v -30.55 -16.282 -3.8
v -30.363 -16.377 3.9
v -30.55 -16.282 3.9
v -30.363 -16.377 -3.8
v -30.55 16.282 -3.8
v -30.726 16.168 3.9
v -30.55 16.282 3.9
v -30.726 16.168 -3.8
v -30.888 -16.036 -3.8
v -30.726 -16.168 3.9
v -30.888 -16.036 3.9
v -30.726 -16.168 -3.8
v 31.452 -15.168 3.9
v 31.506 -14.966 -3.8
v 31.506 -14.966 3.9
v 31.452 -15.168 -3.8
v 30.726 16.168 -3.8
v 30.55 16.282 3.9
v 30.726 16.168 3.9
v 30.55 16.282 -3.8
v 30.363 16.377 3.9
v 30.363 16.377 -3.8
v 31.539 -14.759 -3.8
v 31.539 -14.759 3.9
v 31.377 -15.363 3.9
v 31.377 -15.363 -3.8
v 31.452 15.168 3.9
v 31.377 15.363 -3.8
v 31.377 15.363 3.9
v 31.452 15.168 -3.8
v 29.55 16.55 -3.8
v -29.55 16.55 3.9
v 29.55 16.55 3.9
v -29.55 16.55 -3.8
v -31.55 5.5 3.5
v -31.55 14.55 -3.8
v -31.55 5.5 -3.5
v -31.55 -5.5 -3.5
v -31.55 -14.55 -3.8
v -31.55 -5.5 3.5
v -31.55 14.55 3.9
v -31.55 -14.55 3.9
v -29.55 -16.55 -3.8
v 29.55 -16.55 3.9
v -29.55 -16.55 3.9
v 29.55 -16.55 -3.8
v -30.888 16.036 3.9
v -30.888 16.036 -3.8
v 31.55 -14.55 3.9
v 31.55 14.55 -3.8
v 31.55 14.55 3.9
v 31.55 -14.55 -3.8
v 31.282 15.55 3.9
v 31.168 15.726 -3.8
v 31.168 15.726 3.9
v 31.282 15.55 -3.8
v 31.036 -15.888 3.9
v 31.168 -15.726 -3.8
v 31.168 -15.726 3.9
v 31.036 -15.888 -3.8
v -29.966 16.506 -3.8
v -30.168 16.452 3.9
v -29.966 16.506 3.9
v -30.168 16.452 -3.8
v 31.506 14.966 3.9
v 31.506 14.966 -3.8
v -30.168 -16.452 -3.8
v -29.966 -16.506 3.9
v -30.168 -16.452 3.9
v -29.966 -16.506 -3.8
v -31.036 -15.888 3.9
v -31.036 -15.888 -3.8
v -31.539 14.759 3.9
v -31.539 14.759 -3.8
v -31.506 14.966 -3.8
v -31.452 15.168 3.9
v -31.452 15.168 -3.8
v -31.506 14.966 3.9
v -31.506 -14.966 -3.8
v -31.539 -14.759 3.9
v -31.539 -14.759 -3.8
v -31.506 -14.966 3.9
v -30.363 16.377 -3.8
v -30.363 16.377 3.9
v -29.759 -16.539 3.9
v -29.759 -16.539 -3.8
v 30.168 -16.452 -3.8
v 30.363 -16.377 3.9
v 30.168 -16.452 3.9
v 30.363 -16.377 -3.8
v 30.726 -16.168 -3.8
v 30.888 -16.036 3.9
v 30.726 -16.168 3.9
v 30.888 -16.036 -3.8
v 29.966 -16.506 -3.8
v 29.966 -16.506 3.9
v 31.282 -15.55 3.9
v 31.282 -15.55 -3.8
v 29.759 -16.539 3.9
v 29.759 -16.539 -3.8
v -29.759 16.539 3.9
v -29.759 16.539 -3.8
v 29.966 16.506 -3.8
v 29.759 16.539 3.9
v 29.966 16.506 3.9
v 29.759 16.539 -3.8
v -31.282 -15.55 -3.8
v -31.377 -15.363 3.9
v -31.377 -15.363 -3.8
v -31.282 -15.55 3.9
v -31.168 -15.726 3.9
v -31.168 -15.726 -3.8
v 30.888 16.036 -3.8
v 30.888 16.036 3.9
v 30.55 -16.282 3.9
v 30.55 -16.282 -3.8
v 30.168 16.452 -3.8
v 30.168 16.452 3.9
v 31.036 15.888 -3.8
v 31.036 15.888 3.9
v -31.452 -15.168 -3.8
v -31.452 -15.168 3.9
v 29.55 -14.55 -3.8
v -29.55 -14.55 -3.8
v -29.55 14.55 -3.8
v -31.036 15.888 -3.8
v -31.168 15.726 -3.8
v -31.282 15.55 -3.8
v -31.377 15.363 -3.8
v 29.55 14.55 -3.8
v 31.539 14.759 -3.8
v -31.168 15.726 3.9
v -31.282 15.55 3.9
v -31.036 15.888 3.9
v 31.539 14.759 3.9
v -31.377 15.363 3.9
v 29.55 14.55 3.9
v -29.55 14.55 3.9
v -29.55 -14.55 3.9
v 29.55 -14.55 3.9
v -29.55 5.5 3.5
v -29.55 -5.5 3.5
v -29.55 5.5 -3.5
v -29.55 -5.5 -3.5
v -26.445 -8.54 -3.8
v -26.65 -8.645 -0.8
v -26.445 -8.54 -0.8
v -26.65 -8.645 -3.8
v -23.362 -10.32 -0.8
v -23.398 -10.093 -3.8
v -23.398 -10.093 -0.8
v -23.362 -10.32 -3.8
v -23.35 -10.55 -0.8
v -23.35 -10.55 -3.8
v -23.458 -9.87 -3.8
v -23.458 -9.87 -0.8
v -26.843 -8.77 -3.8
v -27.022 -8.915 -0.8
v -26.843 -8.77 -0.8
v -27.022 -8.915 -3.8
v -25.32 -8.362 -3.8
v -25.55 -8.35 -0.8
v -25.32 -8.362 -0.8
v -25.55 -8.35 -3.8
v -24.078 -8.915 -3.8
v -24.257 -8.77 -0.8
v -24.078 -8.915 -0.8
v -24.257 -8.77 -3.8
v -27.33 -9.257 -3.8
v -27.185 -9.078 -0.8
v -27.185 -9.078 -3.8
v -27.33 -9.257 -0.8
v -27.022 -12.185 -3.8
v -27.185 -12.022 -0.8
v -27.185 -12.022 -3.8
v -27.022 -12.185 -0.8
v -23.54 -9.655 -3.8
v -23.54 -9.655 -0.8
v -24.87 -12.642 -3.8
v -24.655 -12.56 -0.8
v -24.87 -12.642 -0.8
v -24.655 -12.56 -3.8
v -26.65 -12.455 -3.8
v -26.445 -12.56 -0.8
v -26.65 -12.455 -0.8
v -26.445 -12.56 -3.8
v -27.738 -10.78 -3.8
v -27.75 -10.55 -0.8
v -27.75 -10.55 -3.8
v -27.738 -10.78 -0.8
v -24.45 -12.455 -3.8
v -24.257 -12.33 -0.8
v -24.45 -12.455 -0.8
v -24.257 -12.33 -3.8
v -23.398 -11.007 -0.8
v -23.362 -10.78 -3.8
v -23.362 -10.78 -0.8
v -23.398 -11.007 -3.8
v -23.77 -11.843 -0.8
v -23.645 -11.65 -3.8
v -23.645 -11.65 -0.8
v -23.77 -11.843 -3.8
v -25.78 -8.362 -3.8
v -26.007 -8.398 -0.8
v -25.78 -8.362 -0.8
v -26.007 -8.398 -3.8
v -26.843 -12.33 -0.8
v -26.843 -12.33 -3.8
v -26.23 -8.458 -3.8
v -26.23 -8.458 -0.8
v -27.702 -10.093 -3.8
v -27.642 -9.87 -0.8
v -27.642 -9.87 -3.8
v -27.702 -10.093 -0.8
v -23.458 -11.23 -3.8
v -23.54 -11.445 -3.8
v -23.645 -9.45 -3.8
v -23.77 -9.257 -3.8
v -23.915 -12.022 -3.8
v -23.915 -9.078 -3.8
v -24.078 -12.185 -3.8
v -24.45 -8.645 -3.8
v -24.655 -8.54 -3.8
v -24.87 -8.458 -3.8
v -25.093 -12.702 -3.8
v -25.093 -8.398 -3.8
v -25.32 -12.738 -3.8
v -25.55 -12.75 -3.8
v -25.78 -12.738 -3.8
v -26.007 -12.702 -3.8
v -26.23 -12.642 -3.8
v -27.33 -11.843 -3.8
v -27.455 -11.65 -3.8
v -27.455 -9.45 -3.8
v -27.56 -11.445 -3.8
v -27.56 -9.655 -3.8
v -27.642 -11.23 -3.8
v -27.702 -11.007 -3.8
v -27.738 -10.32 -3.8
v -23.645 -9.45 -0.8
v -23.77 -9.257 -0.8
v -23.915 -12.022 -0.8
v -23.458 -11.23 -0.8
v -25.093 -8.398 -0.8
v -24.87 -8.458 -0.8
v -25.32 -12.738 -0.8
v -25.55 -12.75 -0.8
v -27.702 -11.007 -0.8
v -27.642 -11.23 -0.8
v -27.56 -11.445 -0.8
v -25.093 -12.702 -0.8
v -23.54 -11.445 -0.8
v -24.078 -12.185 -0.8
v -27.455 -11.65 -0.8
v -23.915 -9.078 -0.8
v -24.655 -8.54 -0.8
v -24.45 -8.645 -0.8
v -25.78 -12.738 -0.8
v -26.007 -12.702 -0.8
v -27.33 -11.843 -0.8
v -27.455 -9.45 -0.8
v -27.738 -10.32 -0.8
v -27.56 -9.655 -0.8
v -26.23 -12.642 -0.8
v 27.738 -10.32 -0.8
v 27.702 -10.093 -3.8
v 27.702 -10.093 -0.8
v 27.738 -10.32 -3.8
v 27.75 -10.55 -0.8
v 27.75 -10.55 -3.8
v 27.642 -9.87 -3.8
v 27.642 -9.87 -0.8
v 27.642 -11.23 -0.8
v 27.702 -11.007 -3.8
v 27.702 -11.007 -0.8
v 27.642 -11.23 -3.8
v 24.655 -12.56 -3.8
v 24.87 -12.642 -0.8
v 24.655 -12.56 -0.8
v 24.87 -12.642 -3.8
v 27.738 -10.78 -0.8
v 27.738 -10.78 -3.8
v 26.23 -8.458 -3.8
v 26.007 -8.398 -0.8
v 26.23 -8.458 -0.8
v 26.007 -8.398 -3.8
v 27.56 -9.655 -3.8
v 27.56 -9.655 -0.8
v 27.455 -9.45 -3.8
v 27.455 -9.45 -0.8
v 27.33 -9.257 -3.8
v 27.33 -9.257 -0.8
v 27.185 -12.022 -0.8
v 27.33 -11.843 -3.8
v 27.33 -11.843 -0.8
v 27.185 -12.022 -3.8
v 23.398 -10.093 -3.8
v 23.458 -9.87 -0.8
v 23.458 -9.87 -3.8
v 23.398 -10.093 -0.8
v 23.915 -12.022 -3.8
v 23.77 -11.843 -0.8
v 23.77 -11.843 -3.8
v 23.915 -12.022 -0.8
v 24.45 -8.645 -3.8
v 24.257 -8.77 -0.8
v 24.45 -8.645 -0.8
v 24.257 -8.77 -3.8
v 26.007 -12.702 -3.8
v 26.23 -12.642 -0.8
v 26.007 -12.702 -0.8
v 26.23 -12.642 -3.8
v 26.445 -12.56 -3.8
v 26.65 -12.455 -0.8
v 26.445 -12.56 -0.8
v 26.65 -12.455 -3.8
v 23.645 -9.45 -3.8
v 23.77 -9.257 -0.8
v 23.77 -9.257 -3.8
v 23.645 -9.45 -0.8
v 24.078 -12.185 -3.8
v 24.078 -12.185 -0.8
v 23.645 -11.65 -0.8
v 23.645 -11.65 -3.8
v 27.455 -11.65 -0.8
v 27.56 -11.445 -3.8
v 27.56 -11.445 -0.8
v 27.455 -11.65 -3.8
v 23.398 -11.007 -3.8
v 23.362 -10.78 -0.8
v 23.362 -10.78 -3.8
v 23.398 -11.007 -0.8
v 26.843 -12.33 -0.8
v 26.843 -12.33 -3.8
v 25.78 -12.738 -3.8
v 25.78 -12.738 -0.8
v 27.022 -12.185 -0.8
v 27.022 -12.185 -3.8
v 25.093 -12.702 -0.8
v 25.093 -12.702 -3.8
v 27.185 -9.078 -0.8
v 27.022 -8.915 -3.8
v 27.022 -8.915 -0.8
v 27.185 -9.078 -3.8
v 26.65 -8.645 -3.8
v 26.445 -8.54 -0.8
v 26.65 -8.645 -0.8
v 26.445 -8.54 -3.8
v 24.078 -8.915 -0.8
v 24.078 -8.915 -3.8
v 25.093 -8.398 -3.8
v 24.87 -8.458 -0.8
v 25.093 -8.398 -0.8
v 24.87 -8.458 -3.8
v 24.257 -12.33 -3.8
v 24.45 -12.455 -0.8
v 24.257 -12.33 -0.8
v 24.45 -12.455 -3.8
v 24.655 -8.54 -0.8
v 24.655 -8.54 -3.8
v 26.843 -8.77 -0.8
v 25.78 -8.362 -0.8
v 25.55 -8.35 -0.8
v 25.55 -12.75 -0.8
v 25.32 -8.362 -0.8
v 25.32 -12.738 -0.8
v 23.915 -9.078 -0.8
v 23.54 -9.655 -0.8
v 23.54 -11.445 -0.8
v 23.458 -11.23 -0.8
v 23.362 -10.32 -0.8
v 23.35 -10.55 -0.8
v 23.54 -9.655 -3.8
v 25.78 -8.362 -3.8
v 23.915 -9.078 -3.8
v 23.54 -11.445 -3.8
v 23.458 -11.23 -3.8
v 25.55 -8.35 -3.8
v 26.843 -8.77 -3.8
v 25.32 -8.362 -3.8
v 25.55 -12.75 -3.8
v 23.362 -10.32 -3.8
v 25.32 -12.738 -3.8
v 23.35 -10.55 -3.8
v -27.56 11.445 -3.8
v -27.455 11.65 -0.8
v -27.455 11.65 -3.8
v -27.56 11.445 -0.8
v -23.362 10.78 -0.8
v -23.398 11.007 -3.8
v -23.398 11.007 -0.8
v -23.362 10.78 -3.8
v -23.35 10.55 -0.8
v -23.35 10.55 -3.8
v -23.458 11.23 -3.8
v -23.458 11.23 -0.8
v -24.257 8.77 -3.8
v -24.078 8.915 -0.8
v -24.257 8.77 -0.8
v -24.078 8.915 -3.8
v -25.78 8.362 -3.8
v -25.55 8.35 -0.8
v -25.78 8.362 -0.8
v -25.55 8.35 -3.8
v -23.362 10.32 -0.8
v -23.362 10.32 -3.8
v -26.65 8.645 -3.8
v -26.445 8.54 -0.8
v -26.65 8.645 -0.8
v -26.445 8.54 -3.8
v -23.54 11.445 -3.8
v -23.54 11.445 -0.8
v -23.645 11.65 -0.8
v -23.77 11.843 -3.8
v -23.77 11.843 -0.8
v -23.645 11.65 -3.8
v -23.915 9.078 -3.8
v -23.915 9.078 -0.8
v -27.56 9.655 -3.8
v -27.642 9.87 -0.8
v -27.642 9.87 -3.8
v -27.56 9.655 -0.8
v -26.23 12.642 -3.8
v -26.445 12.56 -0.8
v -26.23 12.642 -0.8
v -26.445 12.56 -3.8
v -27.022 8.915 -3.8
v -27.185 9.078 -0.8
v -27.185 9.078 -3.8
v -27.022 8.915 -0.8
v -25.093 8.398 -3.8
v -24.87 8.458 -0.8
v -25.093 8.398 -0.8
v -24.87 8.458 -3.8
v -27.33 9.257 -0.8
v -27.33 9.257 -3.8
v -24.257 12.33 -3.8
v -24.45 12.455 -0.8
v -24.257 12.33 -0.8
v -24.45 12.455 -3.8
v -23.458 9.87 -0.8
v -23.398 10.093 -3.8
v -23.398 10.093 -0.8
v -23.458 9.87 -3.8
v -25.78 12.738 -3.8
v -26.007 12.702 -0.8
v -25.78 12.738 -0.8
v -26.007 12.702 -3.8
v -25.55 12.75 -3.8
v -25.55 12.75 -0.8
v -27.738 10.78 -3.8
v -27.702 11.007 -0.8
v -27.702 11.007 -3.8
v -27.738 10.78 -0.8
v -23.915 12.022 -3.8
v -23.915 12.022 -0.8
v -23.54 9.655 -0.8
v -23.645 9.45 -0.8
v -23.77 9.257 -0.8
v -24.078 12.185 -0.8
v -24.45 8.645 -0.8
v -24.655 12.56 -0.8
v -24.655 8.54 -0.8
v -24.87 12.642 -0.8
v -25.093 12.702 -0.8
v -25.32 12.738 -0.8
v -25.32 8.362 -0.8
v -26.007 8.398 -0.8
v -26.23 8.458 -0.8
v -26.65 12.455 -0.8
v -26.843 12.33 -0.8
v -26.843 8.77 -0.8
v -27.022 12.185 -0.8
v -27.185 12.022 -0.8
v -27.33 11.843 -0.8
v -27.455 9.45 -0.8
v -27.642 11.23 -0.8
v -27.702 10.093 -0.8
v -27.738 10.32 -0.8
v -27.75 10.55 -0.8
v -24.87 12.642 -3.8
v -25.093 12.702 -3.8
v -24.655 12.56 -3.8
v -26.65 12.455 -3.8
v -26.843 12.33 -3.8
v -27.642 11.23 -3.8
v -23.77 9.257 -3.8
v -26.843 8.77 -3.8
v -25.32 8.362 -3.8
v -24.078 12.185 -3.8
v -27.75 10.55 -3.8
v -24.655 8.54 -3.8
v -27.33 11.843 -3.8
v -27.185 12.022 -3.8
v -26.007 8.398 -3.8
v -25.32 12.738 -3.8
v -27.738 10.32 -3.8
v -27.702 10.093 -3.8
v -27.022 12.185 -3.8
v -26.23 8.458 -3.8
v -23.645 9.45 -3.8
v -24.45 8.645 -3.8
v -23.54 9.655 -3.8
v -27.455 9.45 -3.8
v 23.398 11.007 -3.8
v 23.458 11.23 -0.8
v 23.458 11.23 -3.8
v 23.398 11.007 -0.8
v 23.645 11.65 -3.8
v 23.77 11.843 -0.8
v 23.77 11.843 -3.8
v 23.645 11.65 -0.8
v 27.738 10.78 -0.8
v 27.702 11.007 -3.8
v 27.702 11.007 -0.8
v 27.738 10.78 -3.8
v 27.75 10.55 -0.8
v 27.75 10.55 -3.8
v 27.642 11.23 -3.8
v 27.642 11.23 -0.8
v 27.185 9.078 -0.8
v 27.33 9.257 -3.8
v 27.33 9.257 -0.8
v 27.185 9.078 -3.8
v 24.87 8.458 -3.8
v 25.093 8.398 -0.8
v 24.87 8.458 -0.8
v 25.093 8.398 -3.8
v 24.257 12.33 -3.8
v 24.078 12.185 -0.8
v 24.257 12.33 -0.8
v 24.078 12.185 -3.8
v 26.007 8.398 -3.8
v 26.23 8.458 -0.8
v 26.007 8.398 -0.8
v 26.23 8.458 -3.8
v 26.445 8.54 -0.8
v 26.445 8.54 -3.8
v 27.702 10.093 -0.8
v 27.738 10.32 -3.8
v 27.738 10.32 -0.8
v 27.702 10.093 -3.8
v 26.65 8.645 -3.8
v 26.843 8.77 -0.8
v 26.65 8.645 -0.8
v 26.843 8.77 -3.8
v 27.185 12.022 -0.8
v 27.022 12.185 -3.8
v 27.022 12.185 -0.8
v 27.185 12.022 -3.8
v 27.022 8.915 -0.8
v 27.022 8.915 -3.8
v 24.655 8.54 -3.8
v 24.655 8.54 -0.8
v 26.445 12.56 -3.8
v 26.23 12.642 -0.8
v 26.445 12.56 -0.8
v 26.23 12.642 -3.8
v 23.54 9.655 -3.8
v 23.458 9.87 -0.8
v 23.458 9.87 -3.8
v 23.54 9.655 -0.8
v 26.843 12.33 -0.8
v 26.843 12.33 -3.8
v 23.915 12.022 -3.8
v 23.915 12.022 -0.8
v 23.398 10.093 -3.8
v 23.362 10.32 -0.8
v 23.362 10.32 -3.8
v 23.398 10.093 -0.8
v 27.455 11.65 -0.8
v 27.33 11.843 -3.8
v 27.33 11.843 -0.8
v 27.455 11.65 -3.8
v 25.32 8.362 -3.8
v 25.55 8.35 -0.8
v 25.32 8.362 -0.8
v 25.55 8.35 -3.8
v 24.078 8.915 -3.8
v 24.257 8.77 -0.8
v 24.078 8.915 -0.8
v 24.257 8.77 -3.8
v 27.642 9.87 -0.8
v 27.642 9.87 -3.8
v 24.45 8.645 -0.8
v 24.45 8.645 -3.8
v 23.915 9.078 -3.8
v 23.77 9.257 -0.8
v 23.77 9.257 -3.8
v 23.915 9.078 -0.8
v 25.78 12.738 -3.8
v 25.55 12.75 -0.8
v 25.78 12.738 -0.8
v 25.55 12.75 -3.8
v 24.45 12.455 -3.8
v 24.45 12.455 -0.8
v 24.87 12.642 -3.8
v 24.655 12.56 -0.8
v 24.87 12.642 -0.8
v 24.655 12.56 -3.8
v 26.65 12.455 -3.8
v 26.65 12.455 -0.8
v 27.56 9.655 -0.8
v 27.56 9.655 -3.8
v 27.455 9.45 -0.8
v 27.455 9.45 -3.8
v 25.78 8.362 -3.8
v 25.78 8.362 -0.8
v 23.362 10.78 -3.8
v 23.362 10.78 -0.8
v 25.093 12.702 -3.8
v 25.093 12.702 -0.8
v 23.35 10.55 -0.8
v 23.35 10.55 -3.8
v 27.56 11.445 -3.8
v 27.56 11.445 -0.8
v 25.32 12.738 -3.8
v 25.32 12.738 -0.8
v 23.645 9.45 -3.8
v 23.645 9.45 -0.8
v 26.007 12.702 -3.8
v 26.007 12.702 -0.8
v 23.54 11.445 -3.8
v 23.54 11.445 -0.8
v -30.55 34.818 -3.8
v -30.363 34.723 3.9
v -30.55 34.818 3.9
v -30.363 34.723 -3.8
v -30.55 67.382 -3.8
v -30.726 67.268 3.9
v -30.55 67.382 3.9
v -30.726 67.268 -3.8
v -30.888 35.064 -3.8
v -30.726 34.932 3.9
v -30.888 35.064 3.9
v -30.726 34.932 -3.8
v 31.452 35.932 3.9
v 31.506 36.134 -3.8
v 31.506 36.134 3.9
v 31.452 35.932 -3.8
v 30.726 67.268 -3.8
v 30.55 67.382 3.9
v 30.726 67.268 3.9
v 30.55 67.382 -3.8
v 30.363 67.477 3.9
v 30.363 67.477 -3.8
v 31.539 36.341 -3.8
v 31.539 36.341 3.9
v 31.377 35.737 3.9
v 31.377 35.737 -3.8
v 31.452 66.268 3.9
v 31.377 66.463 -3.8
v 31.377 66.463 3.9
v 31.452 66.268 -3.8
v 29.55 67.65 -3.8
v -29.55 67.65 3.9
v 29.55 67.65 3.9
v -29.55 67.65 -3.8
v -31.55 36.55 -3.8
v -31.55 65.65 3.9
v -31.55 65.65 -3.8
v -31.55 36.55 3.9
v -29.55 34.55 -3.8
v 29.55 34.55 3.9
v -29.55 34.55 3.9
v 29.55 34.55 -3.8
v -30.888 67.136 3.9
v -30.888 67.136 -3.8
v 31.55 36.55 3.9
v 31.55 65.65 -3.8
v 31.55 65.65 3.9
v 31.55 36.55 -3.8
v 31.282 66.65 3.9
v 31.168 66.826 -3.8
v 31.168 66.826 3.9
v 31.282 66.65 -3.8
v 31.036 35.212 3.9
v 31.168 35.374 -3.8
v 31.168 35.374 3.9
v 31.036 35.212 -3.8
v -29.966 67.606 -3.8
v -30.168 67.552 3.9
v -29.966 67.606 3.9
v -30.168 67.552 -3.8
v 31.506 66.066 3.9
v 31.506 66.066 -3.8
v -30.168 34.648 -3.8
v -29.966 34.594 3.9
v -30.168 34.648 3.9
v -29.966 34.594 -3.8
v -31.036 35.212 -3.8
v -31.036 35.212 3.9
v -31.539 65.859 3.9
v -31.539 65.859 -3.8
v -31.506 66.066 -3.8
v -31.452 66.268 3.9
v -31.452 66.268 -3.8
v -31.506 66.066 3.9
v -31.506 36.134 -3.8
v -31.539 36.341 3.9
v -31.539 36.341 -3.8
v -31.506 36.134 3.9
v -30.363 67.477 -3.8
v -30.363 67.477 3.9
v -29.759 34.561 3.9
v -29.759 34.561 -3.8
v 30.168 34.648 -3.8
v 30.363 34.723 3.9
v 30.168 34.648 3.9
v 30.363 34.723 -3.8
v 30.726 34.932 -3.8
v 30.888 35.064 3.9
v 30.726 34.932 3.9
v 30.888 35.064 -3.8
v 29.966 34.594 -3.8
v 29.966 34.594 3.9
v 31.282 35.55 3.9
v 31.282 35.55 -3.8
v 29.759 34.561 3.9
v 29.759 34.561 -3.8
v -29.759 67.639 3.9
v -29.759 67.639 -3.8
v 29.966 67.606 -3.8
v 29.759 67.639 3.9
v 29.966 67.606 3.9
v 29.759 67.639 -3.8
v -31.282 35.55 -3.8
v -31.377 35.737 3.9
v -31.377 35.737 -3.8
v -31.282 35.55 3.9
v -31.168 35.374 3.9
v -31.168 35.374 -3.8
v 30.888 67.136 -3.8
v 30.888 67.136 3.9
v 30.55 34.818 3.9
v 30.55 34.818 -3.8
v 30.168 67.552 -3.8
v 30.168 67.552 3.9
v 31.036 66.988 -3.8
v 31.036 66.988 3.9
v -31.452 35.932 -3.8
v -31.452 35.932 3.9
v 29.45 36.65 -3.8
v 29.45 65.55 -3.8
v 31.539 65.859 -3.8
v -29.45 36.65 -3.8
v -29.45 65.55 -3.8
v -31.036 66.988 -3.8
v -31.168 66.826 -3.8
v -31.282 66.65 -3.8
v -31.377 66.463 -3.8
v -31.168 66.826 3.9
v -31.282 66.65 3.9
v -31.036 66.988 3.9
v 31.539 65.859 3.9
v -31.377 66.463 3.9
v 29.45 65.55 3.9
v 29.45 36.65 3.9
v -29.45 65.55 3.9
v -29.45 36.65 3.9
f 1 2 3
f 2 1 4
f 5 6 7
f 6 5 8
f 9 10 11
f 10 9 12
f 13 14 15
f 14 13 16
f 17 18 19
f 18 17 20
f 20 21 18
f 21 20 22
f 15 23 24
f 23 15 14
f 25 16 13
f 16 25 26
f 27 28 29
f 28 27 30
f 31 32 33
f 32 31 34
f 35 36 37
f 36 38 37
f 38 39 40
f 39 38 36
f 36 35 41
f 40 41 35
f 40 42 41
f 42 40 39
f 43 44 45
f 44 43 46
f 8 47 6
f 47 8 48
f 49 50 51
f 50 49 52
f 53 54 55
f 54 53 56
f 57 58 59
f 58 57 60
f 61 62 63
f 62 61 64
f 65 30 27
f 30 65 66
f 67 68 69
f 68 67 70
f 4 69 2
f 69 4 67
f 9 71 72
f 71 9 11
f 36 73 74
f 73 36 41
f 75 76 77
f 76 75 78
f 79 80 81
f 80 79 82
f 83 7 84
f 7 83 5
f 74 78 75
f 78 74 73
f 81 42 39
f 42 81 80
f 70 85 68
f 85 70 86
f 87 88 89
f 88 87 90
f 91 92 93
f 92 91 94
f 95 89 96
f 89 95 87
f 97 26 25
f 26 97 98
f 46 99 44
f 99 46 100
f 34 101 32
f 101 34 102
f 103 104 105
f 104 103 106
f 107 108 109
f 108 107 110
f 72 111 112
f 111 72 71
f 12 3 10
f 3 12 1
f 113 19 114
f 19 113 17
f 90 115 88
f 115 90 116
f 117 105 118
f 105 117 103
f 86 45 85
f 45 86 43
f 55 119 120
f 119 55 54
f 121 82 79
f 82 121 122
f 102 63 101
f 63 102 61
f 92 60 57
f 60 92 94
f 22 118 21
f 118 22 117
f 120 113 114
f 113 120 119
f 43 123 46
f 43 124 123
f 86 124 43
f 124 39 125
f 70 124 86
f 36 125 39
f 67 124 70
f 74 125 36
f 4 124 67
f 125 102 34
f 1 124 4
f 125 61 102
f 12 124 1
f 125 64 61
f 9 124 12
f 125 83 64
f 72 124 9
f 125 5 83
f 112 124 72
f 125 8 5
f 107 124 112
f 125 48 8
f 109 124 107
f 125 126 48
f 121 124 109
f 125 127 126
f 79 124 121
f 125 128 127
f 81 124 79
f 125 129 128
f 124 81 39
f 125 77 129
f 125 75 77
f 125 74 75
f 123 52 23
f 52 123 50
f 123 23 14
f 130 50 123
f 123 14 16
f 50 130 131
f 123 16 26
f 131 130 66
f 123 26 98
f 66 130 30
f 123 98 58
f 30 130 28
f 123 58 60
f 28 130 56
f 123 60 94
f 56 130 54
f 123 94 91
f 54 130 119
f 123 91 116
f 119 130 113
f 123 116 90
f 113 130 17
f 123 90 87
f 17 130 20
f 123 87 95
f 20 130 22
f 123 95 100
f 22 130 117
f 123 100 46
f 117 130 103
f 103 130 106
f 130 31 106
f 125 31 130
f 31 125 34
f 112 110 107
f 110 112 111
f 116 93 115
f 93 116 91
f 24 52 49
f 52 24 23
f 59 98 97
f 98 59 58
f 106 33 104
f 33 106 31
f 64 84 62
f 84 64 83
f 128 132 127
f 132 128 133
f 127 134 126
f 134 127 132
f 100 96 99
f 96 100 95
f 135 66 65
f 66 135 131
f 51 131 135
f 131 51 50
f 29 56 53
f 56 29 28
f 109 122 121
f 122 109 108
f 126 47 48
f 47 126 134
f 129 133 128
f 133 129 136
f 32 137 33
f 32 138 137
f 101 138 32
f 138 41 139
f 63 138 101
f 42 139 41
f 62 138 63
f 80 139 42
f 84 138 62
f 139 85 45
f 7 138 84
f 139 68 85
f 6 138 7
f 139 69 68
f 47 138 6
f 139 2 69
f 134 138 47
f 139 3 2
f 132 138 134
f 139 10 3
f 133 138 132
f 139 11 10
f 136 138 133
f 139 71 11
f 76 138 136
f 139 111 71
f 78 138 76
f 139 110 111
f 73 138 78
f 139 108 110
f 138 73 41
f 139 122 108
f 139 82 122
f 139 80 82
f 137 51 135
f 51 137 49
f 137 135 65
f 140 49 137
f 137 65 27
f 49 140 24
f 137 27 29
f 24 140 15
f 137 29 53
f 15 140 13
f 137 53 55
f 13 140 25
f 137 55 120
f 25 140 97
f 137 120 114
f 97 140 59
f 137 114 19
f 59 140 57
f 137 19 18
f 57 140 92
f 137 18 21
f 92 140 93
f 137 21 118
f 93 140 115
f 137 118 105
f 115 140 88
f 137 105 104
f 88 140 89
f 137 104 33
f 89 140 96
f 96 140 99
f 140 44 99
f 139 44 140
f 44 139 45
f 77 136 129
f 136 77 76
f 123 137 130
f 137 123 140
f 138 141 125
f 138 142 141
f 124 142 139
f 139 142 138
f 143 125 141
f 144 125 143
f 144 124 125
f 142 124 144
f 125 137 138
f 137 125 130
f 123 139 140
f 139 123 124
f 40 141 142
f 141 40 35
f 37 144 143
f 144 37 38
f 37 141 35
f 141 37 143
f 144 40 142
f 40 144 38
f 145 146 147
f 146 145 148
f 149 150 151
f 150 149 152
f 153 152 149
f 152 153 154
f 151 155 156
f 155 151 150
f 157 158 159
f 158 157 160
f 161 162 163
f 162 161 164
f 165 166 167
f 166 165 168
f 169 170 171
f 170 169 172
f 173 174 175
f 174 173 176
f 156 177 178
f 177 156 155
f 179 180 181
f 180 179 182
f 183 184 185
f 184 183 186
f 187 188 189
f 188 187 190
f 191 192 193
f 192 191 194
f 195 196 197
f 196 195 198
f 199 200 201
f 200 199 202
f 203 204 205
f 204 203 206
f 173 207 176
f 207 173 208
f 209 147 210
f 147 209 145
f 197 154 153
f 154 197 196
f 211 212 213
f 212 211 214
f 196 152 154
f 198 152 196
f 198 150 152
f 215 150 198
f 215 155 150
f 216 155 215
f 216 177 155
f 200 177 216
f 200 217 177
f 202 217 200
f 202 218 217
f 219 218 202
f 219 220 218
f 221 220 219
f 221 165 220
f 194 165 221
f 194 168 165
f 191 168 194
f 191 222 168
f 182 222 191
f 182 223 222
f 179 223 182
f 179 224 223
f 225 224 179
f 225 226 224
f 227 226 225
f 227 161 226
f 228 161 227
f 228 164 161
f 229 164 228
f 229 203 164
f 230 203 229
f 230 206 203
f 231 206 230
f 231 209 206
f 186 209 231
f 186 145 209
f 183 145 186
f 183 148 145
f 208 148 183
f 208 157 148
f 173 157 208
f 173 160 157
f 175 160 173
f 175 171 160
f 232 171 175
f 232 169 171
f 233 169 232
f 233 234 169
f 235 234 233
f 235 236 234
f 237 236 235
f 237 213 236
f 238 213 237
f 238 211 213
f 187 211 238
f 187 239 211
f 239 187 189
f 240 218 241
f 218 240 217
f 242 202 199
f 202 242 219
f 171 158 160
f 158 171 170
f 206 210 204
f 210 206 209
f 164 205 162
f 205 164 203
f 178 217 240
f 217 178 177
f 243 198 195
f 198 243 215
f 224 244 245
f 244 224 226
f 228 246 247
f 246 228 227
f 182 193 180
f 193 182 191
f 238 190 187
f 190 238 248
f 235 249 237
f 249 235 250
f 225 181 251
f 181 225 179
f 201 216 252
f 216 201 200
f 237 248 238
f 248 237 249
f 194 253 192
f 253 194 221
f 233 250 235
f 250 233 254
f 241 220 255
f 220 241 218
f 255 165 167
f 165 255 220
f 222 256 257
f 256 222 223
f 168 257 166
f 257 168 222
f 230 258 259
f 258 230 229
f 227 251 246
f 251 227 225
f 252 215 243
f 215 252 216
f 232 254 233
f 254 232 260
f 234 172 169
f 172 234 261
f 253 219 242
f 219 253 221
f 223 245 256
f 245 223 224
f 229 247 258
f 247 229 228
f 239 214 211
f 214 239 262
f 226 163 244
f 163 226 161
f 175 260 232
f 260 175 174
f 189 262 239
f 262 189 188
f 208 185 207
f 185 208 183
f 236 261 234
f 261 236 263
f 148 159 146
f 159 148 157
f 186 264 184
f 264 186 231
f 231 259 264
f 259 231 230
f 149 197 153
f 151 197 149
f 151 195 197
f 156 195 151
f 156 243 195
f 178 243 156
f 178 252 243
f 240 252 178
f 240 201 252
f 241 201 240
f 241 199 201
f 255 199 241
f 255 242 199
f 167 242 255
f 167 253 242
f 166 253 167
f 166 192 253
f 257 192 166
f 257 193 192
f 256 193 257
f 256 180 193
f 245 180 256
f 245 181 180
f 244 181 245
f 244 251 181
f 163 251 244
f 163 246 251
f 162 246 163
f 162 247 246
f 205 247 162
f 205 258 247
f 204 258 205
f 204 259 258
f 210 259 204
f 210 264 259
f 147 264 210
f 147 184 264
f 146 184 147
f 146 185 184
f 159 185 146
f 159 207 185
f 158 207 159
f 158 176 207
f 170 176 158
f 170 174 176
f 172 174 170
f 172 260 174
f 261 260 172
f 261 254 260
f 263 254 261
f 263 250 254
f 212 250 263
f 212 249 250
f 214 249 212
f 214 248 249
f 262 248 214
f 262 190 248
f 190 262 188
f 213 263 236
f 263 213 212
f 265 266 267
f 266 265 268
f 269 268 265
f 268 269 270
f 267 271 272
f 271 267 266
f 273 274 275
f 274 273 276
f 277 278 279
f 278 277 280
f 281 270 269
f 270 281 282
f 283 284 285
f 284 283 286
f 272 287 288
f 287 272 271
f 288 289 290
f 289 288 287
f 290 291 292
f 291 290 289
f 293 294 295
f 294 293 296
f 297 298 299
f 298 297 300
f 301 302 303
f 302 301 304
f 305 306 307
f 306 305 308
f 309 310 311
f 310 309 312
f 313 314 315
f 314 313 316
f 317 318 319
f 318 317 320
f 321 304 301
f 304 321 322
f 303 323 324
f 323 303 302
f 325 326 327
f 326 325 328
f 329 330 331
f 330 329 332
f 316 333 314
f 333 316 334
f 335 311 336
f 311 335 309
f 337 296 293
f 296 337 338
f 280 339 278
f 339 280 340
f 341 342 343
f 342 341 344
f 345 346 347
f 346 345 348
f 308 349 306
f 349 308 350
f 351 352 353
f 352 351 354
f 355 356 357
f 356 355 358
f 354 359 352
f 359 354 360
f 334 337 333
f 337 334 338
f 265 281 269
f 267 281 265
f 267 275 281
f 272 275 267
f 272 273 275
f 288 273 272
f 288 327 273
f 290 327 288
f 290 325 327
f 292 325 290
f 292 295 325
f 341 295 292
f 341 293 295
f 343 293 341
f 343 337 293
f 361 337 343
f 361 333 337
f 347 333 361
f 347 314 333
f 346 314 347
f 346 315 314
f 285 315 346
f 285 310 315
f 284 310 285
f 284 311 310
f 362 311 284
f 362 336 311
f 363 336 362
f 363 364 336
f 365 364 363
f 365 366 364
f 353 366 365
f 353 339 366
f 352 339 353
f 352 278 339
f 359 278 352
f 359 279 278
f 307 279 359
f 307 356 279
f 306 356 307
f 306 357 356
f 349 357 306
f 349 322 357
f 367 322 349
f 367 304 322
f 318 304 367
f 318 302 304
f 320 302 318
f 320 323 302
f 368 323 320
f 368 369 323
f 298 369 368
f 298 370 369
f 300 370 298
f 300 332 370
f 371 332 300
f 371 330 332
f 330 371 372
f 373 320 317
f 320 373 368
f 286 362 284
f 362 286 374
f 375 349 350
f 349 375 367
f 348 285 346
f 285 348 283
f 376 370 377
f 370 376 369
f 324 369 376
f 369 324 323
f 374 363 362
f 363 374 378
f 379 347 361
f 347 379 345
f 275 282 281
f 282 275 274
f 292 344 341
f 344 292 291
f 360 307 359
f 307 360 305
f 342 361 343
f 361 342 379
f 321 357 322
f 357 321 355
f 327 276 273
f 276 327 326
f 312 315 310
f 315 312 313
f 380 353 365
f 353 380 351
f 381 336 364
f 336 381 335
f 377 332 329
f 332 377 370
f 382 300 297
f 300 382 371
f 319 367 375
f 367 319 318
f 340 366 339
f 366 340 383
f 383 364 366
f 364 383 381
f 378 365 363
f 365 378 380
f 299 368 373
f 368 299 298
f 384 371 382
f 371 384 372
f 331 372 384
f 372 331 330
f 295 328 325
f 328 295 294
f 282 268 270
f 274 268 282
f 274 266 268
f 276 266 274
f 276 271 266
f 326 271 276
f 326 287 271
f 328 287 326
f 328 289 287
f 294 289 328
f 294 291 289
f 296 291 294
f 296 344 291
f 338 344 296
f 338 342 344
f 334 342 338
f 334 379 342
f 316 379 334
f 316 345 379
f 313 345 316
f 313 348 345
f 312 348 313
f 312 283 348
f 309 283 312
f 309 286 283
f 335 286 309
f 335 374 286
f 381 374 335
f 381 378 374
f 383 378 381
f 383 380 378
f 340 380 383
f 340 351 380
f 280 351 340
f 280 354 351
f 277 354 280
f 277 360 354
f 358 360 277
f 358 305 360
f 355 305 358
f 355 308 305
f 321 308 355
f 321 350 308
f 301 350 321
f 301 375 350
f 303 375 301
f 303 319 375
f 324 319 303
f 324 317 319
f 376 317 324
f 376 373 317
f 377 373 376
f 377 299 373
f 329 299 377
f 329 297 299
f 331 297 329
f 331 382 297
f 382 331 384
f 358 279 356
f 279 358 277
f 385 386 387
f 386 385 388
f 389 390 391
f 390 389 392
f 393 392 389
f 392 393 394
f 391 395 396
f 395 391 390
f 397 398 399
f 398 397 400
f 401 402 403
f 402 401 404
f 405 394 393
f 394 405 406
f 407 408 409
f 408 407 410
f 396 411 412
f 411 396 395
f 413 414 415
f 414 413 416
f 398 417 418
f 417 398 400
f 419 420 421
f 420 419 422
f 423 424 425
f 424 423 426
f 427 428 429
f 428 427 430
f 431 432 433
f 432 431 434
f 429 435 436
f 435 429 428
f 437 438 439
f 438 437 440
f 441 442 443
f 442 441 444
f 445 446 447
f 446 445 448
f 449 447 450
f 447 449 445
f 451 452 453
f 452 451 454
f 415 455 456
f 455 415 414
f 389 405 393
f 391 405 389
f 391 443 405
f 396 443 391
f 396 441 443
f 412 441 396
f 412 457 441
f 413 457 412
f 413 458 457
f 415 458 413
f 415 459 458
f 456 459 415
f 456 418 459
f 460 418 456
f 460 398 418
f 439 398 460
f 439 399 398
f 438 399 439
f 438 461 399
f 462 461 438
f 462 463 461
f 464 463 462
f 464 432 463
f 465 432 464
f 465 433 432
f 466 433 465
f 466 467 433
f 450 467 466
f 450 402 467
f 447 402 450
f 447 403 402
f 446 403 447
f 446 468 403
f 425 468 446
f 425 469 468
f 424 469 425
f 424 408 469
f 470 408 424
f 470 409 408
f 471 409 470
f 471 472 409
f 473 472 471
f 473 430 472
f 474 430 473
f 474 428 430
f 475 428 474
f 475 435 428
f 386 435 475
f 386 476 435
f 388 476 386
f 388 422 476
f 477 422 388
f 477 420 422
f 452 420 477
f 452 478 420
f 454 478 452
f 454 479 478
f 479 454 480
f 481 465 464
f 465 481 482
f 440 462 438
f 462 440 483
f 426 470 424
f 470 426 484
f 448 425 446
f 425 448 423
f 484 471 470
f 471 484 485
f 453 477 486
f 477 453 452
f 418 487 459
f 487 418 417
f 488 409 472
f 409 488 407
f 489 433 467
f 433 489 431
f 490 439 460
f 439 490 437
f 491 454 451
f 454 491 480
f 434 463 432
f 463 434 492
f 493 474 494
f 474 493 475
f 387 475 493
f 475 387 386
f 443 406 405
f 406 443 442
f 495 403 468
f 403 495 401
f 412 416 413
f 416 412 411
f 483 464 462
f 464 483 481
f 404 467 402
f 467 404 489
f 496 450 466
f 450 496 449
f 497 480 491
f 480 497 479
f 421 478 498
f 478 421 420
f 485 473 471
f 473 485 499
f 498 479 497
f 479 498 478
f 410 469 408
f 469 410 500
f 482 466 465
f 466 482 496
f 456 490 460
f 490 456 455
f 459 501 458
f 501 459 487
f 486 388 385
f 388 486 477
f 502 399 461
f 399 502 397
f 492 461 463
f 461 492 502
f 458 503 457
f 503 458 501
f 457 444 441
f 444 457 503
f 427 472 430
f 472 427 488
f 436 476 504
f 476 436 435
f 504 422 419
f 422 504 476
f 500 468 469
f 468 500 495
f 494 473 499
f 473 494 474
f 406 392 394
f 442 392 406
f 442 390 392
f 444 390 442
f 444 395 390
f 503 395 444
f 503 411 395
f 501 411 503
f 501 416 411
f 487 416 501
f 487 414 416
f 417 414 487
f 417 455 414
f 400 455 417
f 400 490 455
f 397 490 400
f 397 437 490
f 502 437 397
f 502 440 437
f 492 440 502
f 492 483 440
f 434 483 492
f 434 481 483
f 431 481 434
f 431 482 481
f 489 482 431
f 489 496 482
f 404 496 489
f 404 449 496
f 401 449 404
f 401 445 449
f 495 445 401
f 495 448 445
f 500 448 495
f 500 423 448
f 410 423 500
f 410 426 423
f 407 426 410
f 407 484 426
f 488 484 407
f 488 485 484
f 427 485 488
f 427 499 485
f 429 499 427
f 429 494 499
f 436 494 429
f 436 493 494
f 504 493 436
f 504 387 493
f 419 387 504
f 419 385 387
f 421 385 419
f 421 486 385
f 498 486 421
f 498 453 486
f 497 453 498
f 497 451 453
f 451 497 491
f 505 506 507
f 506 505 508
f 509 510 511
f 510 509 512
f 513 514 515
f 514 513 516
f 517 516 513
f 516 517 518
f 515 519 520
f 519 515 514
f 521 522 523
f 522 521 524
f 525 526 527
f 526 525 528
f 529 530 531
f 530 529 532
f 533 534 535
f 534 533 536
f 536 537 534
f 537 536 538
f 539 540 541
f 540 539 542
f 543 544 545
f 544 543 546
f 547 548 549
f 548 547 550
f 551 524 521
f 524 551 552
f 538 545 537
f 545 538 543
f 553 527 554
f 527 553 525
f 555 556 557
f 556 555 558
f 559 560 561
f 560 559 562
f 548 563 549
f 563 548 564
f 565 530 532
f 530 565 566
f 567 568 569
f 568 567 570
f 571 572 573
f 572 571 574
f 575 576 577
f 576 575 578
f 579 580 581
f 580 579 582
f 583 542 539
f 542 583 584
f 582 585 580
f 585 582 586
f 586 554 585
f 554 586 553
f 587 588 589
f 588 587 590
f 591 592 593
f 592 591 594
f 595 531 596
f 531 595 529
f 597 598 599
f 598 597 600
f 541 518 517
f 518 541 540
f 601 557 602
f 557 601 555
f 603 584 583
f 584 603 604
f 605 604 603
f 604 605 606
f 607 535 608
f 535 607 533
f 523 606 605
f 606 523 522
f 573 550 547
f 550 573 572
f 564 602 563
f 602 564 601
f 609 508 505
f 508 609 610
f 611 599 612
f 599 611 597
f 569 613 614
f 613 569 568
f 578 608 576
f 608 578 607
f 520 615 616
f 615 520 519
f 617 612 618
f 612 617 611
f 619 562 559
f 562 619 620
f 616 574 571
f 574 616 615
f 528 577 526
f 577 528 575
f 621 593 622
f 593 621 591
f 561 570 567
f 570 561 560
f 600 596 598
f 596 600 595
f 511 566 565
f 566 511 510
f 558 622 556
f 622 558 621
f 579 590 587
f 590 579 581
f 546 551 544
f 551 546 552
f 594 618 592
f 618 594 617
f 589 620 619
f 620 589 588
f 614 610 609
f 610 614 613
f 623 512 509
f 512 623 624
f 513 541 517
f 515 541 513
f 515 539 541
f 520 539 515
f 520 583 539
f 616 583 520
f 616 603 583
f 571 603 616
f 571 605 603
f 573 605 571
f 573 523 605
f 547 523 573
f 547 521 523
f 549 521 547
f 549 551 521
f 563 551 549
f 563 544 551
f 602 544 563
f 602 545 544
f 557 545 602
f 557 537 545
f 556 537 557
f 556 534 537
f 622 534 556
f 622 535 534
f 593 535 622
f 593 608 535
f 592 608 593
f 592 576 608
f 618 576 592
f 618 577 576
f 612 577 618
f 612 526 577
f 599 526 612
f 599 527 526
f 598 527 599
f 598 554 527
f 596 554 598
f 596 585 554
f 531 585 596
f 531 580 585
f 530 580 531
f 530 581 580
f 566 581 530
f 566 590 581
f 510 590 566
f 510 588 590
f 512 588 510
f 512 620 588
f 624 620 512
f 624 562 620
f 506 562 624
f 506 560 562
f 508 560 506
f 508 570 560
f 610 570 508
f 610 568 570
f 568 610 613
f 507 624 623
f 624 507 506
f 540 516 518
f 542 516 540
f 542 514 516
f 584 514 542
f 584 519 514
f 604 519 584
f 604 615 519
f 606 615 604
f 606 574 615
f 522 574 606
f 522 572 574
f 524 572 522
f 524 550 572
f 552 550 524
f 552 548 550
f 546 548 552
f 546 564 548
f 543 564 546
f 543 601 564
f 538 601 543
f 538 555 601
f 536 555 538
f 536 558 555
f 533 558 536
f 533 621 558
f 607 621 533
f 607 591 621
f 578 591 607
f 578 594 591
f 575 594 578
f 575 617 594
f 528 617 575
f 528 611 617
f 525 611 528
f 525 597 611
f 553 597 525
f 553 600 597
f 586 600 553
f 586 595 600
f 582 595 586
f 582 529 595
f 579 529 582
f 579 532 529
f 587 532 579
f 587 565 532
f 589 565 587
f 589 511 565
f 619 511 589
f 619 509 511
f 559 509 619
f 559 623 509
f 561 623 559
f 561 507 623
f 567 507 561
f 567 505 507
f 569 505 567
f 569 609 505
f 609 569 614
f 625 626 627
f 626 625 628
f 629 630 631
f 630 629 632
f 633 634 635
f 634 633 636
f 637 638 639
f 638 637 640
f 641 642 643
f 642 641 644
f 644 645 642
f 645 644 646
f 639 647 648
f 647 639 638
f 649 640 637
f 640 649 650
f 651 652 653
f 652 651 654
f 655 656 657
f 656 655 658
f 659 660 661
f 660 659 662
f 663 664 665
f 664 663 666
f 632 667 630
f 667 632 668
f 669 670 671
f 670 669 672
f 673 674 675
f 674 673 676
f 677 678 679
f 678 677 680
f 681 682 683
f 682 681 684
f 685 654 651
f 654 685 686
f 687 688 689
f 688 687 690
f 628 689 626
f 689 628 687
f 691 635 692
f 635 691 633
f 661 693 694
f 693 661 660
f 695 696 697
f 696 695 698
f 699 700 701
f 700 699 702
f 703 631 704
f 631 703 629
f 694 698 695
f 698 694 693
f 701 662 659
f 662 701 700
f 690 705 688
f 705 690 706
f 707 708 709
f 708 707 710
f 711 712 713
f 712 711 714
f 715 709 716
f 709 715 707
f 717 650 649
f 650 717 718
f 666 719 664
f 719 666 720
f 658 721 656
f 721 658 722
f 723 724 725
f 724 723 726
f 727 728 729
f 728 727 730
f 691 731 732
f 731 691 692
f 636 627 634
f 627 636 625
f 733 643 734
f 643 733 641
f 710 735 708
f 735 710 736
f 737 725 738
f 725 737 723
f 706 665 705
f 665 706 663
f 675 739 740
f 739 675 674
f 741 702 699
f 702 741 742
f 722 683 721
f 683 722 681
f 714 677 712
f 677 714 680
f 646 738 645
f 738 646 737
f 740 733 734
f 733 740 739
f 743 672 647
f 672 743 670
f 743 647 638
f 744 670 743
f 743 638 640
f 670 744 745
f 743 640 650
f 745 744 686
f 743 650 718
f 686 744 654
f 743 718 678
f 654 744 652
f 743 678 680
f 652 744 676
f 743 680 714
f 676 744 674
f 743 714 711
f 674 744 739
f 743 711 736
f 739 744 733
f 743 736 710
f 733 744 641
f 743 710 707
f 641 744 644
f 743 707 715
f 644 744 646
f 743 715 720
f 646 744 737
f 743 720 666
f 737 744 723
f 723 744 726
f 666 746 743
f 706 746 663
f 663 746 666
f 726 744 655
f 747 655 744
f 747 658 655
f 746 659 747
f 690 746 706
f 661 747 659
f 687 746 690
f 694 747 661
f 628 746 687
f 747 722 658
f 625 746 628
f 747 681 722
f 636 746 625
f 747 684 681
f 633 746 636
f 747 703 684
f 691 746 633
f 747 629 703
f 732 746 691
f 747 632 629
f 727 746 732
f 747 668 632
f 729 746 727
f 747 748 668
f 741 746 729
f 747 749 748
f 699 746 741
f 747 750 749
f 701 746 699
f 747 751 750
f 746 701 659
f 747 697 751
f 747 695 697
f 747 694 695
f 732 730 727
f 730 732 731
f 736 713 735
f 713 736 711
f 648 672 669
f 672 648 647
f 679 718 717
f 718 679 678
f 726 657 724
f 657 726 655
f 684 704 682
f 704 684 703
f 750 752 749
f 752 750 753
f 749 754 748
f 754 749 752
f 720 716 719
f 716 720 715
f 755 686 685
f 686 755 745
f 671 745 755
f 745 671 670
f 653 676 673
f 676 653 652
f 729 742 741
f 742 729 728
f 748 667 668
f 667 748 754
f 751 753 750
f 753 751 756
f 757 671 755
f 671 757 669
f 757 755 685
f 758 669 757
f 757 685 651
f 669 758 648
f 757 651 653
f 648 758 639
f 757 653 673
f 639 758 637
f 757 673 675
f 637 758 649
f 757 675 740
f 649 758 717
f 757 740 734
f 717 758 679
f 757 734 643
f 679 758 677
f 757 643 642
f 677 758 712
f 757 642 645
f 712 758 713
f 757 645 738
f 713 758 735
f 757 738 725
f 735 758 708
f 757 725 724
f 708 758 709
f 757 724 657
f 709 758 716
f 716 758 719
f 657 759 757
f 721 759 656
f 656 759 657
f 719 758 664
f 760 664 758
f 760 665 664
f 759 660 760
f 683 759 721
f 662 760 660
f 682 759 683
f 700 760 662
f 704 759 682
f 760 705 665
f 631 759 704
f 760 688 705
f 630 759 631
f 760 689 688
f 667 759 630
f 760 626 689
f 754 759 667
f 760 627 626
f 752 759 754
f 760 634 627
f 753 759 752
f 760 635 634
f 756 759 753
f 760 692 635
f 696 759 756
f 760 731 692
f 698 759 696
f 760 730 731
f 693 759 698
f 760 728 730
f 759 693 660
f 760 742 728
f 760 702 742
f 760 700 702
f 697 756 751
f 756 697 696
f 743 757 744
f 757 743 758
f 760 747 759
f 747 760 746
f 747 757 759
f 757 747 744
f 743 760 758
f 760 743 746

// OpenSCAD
// ==============================================================================
// TITAN 3D STUDIO — CUSTOM ESP32-S3 SOLO MINER ENCLOSURE (OpenSCAD Model)
// Progettazione 3D Parametrica con Griglia Esagonale REALE a Nido d'Ape
// ==============================================================================

// --- PARAMETRI DIMENSIONALI (in mm) ---
board_length = 58.5;     // Lunghezza PCB ESP32-S3
board_width = 28.5;      // Larghezza PCB ESP32-S3
board_thickness = 1.6;   // Spessore PCB
comp_height_top = 6.0;   // Altezza componenti superiori
comp_height_bot = 3.0;   // Altezza componenti inferiori
wall_thickness = 2.0;    // Spessore pareti scocca PLA
clearance = 0.6;         // Tolleranza incastro

inner_l = board_length + clearance;
inner_w = board_width + clearance;
inner_h = comp_height_top + comp_height_bot + board_thickness + clearance;

outer_l = inner_l + (wall_thickness * 2);
outer_w = inner_w + (wall_thickness * 2);
outer_h = inner_h + (wall_thickness * 2);

$fn = 60;

// --- MODULO PER SINGOLO ESAGONO NIDO D'APE ---
module hex_cell(r, h) {
    cylinder(r = r, h = h, $fn = 6, center = true);
}

// --- MODULO GRIGLIA A NIDO D'APE ESAGONALE COMPLETA ---
module honeycomb_grid(width, length, hex_r, wall, height) {
    x_spacing = (hex_r * sqrt(3)) + wall;
    y_spacing = (hex_r * 1.5) + (wall * 0.5);
    
    for (y = [-length/2 : y_spacing : length/2]) {
        row = round(y / y_spacing);
        x_offset = (abs(row) % 2 == 1) ? x_spacing / 2 : 0;
        
        for (x = [-width/2 + x_offset : x_spacing : width/2 - x_offset]) {
            translate([x, y, 0])
                rotate([0, 0, 30])
                    hex_cell(r = hex_r, h = height);
        }
    }
}

// --- MODULO BASE: CASE INFERIORE CON NIDO D'APE ---
module bottom_case() {
    difference() {
        // Blocco esterno arrotondato
        minkowski() {
            cube([outer_l - 4, outer_w - 4, outer_h / 2], center = true);
            cylinder(r = 2, h = 0.1);
        }

        // Cavità interna per ESP32-S3
        translate([0, 0, wall_thickness / 2])
            cube([inner_l, inner_w, outer_h], center = true);

        // Porta USB-C di alimentazione
        translate([-outer_l / 2 + 1, 0, 0])
            cube([wall_thickness * 3, 11, 7], center = true);

        // GRIGLIA A NIDO D'APE ESAGONALE INFERIORE
        translate([0, 0, -outer_h/4])
            honeycomb_grid(width = inner_l - 8, length = inner_w - 6, hex_r = 2.4, wall = 1.0, height = wall_thickness * 3);
    }

    // Supporti d'appoggio interni PCB
    translate([-inner_l/2 + 4, -inner_w/2 + 4, -outer_h/4 + 1.5])
        cylinder(r = 2.2, h = comp_height_bot, center = true);
    translate([inner_l/2 - 4, -inner_w/2 + 4, -outer_h/4 + 1.5])
        cylinder(r = 2.2, h = comp_height_bot, center = true);
    translate([-inner_l/2 + 4, inner_w/2 - 4, -outer_h/4 + 1.5])
        cylinder(r = 2.2, h = comp_height_bot, center = true);
    translate([inner_l/2 - 4, inner_w/2 - 4, -outer_h/4 + 1.5])
        cylinder(r = 2.2, h = comp_height_bot, center = true);
}

// --- MODULO COPERCHIO SUPERIORE CON NIDO D'APE & LOGO TITAN 3D ---
module top_cover() {
    translate([0, outer_w + 18, 0]) {
        difference() {
            // Blocco esterno coperchio
            minkowski() {
                cube([outer_l - 4, outer_w - 4, outer_h / 2], center = true);
                cylinder(r = 2, h = 0.1);
            }

            // Cavità interna per incastro a scatto
            translate([0, 0, -wall_thickness / 2])
                cube([inner_l - 0.2, inner_w - 0.2, outer_h], center = true);

            // GRIGLIA A NIDO D'APE ESAGONALE SUPERIORE
            translate([0, 0, outer_h/4])
                honeycomb_grid(width = inner_l - 8, length = inner_w - 6, hex_r = 2.4, wall = 1.0, height = wall_thickness * 3);

            // LOGO INCISO "TITAN 3D"
            translate([0, 0, outer_h/4 - 0.5])
                linear_extrude(height = 1.5)
                    text("TITAN 3D", size = 4.2, halign = "center", valign = "center", font = "Liberation Sans:style=Bold");
        }
    }
}

// RENDERING COMPLETO
bottom_case();
top_cover();
